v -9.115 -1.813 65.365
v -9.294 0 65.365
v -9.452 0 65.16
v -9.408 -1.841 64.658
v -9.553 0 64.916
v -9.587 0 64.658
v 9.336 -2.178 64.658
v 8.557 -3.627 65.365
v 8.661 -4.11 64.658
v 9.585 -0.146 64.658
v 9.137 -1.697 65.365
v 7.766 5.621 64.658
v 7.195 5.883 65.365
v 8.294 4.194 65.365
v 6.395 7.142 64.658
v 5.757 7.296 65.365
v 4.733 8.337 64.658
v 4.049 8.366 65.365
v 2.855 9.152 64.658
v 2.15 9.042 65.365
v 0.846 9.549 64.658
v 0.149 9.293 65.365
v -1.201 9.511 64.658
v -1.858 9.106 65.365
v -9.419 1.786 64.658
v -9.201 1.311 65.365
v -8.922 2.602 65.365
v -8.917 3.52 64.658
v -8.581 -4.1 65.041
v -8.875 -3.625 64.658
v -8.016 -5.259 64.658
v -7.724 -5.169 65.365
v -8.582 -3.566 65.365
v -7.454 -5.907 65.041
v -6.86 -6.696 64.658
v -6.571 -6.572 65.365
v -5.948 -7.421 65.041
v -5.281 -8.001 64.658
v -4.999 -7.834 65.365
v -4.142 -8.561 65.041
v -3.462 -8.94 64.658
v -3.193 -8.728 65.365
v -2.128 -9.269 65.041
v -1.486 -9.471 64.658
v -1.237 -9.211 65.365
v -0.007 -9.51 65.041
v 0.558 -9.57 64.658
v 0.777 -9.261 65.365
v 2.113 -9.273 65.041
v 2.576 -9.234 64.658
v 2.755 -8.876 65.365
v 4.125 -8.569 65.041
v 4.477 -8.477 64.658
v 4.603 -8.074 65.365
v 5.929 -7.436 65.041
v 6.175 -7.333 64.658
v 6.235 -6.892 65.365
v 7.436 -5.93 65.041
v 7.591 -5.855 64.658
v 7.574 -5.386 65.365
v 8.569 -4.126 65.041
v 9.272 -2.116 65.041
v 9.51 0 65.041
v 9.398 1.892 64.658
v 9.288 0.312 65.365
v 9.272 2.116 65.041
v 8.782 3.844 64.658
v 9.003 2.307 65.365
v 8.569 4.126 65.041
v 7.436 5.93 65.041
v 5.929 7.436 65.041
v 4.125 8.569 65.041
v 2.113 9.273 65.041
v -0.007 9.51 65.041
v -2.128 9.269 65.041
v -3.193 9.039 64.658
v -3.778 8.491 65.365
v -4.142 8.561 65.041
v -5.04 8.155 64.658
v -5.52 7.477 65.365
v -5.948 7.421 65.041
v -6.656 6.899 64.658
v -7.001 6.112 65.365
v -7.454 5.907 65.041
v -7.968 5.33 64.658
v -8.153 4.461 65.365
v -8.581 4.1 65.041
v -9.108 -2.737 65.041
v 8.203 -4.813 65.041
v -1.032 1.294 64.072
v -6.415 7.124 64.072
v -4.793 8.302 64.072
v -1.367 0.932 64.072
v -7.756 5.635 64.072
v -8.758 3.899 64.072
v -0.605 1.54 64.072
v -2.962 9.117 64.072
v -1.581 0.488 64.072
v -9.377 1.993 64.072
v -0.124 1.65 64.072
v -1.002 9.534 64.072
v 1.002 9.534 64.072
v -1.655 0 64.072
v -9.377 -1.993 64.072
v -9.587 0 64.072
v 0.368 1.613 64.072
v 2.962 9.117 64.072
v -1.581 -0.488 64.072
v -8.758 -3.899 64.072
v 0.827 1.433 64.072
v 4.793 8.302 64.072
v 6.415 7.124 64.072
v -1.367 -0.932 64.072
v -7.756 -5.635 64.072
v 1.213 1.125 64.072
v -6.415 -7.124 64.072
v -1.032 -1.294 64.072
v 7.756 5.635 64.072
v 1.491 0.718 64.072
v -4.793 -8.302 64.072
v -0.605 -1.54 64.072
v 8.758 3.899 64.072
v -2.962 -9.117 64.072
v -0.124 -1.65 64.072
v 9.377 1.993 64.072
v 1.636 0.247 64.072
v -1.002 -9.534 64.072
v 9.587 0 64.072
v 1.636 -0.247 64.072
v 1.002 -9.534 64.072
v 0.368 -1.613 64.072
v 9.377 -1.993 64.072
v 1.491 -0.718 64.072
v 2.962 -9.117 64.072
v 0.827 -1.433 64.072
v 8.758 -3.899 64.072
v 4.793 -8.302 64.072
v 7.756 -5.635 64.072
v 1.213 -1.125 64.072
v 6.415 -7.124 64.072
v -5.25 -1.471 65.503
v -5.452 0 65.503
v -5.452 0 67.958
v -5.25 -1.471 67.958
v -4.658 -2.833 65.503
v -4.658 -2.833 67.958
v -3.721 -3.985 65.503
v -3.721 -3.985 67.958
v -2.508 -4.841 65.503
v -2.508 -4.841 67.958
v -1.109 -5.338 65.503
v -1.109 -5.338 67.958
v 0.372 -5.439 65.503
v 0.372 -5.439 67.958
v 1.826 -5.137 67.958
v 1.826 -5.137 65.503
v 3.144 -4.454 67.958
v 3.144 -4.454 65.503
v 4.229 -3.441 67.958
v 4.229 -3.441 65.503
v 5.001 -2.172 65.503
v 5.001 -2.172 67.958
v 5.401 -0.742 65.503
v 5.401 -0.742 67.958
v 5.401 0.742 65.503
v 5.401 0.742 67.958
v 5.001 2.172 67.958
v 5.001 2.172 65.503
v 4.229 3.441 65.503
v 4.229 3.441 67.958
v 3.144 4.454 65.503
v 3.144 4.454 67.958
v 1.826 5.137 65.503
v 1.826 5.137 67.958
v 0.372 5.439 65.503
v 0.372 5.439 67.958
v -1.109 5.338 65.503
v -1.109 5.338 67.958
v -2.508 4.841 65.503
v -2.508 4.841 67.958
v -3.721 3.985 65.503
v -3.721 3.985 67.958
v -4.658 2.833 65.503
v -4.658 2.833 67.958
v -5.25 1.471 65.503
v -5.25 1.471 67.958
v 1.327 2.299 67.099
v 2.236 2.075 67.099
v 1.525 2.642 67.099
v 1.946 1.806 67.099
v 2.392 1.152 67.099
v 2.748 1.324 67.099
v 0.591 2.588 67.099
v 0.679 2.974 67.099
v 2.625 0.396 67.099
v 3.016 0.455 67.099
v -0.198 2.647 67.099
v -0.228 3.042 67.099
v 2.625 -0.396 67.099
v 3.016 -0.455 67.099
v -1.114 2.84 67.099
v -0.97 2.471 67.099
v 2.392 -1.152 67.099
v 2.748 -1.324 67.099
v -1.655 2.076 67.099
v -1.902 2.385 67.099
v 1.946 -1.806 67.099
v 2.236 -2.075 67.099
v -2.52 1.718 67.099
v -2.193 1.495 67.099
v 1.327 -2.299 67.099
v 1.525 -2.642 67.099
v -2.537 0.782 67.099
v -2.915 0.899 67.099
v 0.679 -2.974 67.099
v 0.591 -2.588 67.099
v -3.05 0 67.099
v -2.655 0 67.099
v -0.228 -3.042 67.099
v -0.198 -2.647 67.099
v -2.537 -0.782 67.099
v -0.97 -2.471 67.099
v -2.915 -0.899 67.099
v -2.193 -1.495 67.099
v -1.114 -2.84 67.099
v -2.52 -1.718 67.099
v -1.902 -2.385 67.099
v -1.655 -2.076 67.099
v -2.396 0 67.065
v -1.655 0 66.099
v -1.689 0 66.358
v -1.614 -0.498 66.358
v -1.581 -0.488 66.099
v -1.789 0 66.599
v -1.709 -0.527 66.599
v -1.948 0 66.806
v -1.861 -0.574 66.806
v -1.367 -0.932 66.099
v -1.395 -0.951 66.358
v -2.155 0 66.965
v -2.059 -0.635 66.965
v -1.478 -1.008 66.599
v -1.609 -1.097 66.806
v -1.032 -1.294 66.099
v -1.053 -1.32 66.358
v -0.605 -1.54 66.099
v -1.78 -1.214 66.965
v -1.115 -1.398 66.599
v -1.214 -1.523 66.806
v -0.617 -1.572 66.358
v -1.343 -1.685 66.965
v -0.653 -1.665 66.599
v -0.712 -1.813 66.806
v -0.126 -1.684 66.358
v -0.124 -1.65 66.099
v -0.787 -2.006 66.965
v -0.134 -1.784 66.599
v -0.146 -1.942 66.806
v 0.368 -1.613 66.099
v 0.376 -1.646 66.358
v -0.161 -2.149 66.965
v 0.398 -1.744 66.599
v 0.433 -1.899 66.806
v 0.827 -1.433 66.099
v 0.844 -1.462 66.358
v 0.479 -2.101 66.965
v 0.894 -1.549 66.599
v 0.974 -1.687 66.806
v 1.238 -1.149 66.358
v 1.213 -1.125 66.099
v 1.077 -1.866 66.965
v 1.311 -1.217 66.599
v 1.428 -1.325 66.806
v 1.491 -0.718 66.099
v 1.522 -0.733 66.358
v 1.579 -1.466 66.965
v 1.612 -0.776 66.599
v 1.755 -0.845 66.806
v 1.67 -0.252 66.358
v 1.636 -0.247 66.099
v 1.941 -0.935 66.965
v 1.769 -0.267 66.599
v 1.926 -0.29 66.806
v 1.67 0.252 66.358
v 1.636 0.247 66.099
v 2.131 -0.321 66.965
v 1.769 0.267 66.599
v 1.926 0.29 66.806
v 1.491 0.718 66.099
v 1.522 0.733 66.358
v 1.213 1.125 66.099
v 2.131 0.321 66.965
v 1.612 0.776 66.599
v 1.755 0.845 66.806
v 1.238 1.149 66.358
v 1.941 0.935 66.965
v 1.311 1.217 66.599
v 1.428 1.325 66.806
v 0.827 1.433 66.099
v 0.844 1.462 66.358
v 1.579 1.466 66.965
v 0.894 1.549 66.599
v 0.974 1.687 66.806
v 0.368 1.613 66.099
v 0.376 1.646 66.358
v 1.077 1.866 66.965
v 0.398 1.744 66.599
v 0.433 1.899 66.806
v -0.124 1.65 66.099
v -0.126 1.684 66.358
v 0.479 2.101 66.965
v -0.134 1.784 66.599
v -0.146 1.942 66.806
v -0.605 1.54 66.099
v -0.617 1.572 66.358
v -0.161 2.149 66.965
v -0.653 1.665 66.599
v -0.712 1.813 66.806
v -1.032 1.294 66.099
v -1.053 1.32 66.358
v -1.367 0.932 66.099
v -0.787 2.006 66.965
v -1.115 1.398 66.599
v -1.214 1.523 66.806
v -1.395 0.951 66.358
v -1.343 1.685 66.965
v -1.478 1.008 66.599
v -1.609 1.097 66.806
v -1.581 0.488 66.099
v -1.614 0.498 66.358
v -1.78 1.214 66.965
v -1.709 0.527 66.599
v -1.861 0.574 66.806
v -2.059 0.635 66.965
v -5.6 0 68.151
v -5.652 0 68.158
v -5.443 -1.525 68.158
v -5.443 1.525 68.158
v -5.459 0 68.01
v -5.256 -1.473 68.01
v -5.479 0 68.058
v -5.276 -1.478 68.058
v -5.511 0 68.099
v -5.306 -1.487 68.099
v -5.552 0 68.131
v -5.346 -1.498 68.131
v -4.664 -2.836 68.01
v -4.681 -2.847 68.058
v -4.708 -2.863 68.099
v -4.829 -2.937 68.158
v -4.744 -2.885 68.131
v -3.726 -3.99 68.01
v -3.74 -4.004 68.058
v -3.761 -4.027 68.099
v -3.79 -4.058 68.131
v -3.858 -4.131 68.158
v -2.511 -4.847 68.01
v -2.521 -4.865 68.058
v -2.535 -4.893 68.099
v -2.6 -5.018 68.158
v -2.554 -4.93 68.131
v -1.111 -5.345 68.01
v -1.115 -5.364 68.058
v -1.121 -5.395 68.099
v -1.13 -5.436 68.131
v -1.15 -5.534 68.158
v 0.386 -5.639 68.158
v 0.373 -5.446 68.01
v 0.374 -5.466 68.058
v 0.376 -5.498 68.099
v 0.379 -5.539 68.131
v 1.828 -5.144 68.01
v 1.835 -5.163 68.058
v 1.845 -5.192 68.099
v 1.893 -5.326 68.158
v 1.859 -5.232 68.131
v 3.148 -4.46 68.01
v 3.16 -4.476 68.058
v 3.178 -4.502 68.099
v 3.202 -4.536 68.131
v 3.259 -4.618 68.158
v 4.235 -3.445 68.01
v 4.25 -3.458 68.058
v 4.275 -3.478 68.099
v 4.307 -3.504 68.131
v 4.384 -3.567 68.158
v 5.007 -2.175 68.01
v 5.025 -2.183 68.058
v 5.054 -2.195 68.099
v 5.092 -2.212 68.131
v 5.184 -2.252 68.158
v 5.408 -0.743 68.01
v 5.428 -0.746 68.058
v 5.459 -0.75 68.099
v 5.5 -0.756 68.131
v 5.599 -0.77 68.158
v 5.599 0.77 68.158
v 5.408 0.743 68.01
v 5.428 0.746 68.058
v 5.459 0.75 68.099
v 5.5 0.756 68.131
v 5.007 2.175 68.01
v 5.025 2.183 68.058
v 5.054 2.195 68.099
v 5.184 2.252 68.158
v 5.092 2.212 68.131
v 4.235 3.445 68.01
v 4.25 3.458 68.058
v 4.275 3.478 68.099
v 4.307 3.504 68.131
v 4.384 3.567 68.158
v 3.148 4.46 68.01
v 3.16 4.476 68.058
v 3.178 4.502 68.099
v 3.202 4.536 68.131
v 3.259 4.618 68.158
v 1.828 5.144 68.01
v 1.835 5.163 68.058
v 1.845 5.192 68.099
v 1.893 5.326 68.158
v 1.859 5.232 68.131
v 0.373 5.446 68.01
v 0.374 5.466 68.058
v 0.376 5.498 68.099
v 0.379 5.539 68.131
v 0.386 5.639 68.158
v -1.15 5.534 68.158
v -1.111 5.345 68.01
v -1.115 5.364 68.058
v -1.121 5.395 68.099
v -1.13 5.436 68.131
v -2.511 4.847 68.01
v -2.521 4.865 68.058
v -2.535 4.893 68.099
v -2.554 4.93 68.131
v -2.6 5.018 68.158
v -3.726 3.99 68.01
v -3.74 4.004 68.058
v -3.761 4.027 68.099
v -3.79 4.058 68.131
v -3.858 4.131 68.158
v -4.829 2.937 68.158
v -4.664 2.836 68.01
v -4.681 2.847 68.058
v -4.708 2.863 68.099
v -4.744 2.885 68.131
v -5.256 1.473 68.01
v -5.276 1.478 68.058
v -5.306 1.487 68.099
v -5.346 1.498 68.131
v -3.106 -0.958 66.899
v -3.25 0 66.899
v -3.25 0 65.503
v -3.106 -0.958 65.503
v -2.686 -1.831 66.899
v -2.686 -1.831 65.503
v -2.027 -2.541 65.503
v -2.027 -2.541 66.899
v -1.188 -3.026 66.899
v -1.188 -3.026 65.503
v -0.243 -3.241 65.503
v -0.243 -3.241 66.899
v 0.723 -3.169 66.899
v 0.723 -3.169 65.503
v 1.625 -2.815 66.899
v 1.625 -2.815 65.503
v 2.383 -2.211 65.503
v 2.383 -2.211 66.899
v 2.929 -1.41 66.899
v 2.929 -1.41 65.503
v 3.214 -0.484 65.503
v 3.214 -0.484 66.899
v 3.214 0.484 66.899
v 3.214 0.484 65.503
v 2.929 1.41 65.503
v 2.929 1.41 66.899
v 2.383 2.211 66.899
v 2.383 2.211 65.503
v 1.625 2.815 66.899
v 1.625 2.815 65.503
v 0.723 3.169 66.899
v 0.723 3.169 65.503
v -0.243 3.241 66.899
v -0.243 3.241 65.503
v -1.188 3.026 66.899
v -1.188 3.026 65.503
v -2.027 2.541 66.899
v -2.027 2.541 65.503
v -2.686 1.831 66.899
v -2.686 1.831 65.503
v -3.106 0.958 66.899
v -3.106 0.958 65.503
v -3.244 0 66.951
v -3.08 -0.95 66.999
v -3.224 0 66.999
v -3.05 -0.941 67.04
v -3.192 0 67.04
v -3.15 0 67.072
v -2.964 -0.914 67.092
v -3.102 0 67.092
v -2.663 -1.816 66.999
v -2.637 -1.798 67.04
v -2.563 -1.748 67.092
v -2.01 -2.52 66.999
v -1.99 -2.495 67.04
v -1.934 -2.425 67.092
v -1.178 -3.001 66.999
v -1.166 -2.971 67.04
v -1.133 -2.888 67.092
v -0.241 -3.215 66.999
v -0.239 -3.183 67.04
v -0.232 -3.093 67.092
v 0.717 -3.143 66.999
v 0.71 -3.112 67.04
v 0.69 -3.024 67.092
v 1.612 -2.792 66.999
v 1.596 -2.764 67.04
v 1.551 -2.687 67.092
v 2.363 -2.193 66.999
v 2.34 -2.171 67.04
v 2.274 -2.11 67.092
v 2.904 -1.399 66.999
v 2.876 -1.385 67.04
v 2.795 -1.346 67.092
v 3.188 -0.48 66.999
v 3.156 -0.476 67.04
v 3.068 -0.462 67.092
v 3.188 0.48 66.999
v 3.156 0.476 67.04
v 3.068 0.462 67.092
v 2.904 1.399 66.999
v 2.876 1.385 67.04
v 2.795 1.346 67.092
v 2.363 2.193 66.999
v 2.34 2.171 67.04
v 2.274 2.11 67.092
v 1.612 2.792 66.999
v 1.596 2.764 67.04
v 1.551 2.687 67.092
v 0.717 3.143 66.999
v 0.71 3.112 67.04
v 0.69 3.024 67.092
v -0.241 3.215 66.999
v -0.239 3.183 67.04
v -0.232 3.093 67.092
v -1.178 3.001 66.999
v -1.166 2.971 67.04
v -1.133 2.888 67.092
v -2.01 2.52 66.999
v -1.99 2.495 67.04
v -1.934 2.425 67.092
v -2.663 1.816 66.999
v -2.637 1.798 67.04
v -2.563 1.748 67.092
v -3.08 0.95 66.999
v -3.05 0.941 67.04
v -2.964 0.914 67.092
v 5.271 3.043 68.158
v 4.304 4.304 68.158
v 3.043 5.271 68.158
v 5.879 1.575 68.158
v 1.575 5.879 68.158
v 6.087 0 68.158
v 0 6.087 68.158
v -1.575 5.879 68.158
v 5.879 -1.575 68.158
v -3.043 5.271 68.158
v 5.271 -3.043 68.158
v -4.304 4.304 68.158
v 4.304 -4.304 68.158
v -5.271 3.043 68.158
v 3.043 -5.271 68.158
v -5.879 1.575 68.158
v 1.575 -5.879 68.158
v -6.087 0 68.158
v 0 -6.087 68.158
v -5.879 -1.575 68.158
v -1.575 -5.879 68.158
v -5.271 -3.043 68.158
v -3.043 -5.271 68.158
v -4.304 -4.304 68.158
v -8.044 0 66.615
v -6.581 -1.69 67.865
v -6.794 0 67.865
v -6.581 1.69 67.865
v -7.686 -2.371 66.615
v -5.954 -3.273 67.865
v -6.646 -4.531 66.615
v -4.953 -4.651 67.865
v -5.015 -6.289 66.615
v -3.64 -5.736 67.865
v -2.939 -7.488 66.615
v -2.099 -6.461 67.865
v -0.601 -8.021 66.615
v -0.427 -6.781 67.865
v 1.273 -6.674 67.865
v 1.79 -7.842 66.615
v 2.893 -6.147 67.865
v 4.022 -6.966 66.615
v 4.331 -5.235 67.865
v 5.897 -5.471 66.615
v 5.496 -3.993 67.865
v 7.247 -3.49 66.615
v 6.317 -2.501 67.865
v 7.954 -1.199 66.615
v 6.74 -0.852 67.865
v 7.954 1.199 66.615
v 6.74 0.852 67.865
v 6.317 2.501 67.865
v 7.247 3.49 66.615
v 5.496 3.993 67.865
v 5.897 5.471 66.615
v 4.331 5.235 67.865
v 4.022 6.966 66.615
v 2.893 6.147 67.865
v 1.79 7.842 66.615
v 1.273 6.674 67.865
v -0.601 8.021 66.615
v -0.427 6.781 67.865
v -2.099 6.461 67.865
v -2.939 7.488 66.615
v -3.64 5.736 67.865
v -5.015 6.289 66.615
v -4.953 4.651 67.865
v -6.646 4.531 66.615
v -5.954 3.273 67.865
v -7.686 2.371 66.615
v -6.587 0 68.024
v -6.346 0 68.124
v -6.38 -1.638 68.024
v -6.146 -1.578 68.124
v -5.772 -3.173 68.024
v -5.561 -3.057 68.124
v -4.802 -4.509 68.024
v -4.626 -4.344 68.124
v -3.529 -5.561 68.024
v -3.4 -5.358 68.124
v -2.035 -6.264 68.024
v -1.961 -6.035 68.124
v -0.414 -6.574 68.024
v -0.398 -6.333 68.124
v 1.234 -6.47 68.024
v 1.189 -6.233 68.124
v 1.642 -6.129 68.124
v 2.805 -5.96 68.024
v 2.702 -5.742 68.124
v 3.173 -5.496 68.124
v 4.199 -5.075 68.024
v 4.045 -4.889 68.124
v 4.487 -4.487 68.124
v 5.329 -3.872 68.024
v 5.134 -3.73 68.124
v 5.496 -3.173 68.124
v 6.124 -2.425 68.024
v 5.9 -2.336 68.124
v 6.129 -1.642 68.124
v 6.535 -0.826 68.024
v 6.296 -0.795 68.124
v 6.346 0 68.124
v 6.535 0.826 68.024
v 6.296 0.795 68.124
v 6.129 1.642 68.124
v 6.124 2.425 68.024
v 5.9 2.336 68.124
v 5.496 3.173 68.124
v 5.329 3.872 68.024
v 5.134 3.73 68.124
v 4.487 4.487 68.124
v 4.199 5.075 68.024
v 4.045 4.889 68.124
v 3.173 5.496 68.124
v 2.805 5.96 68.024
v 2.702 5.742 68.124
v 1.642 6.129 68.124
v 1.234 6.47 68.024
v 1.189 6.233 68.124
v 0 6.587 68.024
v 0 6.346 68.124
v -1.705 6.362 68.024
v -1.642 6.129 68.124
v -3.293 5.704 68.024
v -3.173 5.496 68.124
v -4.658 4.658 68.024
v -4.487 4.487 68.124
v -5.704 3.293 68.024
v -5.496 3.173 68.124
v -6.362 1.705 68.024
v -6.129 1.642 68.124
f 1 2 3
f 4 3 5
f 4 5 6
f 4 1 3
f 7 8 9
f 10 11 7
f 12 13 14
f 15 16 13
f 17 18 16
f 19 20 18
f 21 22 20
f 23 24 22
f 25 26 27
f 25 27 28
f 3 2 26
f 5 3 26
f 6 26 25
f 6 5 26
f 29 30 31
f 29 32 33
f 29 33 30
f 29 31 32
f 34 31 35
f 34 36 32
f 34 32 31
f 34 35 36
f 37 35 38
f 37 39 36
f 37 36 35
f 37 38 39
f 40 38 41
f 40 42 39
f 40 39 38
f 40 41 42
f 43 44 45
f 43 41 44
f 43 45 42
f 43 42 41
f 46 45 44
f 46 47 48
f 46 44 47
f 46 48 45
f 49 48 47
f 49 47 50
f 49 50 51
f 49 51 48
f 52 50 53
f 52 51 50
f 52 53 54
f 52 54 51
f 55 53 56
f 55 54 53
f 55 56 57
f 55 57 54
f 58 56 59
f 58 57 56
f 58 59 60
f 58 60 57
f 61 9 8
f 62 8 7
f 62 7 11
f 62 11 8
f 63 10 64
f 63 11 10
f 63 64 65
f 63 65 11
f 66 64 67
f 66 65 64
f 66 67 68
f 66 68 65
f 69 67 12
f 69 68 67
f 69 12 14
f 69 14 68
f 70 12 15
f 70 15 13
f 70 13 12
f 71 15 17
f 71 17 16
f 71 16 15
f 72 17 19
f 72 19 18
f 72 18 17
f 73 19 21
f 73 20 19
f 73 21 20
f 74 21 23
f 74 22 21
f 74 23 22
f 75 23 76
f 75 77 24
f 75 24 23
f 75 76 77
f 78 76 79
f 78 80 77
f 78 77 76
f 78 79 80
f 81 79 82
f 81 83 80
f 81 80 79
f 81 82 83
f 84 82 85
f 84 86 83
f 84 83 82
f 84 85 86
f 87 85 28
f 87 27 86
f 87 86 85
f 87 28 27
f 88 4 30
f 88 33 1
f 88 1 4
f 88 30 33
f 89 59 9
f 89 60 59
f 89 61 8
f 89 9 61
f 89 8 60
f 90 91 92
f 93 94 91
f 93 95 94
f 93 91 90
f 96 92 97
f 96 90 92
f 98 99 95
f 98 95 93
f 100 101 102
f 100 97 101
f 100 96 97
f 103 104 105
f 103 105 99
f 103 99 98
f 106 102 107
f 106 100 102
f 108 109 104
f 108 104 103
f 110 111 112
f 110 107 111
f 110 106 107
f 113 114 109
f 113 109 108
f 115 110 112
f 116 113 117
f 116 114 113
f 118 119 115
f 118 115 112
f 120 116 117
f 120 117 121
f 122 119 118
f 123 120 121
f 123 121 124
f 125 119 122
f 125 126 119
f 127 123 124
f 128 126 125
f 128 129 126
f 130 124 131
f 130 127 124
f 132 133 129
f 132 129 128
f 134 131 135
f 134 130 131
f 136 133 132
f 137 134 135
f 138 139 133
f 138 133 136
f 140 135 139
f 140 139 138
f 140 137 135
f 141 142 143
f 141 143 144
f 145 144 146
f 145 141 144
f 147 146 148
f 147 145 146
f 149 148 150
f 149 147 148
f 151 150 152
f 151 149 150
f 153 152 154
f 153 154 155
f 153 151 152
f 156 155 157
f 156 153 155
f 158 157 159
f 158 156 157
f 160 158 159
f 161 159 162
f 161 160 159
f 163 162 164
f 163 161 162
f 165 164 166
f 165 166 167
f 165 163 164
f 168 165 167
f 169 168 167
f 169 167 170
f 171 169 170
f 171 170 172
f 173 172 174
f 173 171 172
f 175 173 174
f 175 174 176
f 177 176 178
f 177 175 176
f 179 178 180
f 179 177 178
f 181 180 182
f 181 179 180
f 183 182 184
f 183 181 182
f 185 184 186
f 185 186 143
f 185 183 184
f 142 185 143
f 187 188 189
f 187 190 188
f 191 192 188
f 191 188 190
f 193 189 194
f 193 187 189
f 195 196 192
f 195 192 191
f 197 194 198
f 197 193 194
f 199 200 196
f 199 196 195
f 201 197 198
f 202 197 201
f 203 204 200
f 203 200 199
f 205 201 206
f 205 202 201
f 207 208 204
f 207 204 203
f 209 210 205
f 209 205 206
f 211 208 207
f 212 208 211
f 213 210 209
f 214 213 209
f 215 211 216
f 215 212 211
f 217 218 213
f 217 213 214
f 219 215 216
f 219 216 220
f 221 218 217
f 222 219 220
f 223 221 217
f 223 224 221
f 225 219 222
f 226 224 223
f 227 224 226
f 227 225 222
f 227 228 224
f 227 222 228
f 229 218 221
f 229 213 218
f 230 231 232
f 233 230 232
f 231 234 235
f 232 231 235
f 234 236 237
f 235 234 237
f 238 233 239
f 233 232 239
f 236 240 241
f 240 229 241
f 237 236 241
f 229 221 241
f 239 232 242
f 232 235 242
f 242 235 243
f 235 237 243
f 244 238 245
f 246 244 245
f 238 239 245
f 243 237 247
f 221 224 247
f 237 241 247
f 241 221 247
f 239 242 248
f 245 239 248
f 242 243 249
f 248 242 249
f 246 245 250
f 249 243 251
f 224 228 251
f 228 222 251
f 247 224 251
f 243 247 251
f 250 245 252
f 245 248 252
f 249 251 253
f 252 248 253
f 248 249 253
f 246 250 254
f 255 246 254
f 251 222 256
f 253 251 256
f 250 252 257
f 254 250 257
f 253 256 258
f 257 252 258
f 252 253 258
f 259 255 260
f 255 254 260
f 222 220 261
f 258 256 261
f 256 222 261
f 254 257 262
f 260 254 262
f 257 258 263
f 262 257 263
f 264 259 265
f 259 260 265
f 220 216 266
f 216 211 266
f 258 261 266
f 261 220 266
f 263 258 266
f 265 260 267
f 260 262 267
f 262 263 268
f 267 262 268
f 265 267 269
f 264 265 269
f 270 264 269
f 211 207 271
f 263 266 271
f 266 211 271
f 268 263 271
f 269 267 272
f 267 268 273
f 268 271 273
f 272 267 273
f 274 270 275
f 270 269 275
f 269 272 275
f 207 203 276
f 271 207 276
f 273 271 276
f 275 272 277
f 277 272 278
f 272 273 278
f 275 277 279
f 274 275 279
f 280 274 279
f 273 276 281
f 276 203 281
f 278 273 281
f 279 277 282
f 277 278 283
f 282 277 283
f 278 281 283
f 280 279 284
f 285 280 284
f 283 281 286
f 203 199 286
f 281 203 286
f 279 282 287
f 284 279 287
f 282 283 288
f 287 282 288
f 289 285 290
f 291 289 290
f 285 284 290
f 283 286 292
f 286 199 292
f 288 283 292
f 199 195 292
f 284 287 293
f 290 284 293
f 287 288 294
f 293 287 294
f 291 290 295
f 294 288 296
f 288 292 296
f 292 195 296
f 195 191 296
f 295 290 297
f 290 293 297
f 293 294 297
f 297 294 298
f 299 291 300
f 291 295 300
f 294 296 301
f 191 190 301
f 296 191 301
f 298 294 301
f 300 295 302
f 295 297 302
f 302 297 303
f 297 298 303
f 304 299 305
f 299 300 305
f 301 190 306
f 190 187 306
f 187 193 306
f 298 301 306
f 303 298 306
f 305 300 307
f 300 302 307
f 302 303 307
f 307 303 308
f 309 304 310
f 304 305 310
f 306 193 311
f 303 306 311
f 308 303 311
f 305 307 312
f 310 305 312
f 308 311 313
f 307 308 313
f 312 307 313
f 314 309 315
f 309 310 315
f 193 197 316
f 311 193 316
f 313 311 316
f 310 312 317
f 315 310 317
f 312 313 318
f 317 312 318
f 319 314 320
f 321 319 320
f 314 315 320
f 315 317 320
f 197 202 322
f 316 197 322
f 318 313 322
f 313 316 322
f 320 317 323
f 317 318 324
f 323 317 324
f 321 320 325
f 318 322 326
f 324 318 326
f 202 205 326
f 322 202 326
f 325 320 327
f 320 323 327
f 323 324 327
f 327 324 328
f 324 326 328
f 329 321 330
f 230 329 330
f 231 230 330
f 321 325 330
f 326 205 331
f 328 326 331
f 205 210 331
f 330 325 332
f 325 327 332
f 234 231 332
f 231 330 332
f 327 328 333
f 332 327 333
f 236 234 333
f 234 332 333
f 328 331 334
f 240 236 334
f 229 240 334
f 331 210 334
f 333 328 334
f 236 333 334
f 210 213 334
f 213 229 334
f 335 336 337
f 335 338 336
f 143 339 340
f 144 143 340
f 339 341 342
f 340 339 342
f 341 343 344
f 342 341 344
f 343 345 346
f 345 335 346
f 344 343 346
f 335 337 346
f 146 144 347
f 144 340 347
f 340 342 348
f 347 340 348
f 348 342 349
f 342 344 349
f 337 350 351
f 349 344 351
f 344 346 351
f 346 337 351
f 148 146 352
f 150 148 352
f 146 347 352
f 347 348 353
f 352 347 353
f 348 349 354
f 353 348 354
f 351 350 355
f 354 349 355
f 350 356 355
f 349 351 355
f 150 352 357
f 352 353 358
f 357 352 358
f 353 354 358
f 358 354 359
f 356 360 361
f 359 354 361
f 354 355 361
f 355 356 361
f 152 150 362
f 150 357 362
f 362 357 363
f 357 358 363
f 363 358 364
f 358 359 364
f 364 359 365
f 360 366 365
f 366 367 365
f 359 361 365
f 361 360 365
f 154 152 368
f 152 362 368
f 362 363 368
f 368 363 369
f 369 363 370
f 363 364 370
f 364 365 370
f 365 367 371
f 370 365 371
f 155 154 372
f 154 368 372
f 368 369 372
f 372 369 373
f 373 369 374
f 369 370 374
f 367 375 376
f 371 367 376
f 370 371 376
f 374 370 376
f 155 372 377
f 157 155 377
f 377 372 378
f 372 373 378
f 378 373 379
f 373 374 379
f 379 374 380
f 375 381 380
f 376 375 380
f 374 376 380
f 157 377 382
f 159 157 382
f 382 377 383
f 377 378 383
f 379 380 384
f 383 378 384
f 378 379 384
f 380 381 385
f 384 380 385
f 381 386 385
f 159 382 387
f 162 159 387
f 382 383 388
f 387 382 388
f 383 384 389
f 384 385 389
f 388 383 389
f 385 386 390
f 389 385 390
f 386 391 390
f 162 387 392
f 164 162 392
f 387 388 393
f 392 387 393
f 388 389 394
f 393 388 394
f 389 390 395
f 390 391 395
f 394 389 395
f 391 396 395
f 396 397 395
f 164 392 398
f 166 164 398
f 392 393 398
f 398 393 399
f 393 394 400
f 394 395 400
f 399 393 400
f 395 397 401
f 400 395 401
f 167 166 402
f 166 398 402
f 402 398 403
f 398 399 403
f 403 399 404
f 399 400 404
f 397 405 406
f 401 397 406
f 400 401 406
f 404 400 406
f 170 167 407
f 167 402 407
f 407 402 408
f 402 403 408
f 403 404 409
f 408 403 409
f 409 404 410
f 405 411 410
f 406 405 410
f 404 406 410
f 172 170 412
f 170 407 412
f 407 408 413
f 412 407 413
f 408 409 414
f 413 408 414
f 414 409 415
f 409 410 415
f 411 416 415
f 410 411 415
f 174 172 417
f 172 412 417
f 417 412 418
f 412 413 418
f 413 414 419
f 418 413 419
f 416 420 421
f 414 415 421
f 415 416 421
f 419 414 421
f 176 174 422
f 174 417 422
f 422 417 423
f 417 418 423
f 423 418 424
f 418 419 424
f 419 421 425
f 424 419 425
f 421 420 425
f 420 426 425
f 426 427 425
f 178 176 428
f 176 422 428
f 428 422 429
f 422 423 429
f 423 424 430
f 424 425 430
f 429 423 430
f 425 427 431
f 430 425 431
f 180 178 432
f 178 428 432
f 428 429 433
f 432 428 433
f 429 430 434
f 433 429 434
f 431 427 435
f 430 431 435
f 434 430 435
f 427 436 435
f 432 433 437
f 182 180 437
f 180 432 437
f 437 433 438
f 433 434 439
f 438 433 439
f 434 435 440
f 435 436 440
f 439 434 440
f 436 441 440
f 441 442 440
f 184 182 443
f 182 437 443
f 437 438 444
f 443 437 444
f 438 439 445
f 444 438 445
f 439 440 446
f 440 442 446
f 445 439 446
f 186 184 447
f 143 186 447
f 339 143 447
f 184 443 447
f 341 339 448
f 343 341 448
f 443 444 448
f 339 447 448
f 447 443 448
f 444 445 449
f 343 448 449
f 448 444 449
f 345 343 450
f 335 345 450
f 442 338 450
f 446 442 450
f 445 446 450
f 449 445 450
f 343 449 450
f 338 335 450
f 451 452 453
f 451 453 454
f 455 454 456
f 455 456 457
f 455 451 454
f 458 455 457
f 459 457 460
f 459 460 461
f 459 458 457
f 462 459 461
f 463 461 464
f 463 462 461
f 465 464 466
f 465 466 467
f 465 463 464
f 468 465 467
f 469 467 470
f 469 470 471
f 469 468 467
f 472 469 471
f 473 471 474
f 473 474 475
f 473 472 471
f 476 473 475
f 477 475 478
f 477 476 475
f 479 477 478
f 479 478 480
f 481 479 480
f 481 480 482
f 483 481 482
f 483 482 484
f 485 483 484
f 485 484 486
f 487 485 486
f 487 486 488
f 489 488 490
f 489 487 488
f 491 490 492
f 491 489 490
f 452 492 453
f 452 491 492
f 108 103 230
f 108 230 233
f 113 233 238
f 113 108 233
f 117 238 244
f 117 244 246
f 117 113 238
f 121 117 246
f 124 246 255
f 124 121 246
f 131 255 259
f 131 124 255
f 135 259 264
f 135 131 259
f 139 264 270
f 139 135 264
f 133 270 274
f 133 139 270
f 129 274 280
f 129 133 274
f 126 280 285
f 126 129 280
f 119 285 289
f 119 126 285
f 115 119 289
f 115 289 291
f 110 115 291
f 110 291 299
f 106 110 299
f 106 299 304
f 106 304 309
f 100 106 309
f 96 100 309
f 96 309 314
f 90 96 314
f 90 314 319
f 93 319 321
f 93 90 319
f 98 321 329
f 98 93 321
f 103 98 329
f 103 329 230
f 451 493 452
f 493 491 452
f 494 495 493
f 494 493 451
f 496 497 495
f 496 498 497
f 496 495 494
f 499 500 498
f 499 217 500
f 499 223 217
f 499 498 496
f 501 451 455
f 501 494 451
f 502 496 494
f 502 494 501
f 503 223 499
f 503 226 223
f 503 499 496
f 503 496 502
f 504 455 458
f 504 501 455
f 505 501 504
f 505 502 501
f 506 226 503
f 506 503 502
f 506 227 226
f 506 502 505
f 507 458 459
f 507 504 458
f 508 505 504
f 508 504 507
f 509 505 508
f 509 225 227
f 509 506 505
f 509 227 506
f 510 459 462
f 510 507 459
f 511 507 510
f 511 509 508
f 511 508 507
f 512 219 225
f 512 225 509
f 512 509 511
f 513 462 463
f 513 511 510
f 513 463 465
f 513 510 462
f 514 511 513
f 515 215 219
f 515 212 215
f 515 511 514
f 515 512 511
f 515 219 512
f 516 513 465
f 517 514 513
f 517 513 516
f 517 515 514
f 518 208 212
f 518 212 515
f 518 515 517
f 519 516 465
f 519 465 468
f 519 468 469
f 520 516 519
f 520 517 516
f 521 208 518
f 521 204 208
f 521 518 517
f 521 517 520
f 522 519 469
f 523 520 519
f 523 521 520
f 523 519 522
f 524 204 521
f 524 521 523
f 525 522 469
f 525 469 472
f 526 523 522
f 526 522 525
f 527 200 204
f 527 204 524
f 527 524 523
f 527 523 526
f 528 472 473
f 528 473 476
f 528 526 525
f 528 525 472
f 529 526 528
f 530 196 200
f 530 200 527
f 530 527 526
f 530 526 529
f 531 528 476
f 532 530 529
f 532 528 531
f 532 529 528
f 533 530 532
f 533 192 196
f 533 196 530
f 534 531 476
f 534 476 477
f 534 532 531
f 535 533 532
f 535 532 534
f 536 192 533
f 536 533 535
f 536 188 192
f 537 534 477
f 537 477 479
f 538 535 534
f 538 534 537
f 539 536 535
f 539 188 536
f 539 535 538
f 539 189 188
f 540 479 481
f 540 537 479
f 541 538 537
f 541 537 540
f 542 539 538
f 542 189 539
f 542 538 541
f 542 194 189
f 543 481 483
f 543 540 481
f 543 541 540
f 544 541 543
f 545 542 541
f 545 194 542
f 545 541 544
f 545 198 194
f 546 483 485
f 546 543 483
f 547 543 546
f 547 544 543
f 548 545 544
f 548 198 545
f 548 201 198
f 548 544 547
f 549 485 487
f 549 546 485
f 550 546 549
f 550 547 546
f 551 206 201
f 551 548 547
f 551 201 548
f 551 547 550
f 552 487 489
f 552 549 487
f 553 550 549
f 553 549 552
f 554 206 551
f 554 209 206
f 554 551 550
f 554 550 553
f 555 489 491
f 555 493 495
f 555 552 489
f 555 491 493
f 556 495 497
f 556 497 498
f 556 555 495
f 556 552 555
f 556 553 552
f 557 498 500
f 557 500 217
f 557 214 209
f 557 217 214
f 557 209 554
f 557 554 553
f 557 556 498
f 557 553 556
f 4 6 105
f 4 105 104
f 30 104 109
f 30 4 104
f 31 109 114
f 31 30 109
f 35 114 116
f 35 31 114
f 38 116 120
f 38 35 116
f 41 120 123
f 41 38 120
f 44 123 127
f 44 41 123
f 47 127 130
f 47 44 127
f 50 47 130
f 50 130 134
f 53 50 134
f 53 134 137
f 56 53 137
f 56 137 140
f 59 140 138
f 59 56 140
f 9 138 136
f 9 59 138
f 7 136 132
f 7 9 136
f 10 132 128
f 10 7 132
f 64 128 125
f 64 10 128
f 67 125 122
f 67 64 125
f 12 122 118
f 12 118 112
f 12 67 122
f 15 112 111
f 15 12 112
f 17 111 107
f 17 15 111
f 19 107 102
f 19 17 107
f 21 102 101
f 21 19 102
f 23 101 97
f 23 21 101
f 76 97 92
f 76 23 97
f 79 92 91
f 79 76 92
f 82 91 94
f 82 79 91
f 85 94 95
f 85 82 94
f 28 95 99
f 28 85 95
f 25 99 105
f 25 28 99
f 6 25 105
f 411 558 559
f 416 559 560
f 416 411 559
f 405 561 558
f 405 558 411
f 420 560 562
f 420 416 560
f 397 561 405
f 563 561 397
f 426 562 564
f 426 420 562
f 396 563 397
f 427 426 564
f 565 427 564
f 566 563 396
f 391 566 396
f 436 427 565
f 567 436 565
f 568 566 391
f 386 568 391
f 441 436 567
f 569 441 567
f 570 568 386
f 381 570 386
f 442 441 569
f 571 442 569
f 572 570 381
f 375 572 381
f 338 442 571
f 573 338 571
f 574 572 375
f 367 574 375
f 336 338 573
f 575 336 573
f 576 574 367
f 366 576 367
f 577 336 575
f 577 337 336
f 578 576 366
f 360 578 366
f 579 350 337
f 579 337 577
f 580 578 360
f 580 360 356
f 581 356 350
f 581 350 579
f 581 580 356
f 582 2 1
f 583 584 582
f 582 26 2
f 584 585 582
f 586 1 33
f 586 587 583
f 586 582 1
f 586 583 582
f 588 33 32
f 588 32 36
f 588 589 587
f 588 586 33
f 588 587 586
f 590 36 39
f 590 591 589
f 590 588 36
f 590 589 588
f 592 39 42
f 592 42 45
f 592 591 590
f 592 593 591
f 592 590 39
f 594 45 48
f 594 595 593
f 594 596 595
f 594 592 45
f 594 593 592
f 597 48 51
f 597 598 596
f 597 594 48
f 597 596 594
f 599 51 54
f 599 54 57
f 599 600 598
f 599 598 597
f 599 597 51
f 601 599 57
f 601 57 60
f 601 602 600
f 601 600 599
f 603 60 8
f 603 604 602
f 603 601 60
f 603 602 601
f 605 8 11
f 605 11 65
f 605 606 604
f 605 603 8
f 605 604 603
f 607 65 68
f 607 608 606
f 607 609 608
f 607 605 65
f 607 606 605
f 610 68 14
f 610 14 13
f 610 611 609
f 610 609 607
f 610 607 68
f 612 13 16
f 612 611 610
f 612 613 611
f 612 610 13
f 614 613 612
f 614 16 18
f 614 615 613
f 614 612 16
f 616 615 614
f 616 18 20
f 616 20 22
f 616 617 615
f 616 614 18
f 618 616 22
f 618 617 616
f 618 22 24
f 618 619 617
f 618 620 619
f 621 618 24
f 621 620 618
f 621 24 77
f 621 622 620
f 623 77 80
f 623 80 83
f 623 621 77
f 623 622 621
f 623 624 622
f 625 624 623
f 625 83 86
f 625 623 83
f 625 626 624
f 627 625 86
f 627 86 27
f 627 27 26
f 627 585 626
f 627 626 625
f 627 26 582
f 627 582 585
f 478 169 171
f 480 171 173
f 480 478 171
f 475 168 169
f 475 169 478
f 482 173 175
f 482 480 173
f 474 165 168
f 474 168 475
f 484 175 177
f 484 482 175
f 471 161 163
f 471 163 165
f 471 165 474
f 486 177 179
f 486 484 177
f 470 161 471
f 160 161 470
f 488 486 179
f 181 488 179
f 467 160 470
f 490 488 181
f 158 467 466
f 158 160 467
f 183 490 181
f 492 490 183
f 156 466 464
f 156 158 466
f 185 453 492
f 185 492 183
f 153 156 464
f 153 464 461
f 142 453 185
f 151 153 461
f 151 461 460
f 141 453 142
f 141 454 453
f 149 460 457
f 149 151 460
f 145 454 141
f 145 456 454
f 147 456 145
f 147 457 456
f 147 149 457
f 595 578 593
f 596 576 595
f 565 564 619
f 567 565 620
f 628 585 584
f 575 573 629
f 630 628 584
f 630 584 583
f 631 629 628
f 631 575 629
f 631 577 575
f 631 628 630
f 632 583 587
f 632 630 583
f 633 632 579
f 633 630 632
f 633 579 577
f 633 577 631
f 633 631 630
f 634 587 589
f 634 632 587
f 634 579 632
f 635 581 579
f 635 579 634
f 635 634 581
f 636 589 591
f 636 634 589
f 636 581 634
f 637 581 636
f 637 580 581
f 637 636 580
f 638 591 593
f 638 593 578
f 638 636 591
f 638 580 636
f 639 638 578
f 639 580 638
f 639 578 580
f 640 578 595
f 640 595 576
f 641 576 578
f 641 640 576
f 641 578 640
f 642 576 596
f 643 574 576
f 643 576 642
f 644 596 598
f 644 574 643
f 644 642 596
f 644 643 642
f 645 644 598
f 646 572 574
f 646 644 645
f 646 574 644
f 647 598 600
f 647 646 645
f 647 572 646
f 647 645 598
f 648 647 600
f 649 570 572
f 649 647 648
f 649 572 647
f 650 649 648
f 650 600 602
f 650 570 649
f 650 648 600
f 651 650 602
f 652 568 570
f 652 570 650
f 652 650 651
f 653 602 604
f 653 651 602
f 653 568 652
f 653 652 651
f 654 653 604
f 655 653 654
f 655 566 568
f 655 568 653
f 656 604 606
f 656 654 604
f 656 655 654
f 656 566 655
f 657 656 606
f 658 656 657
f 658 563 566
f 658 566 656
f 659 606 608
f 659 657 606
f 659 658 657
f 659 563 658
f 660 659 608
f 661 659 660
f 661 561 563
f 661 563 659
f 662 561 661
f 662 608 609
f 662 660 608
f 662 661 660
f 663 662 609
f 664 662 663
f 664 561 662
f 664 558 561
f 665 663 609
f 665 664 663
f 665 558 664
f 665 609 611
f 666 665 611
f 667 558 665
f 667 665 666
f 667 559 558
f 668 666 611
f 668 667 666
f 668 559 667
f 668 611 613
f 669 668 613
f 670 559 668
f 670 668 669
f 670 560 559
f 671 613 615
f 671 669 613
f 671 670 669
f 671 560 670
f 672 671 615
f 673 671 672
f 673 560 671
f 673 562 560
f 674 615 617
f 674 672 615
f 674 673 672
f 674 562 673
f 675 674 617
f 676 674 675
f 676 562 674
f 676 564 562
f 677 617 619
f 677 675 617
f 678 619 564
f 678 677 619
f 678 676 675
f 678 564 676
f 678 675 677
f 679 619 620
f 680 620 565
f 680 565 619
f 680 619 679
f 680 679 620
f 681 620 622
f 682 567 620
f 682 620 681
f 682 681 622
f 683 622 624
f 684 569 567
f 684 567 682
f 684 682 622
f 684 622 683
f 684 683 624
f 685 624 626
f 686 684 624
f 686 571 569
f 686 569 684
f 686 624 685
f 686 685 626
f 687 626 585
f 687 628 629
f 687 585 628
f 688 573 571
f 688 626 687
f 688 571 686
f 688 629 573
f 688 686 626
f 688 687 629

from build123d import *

# Parameters (mm, degrees)
FILLET005_R = 1
FILLET006_R = 1
FILLET007_R = 1
FILLET008_R = 0.2
FILLET009_R = 0.2


with BuildPart() as part:
    # Sketch006 → Revolution003 (revolve)
    with BuildSketch(Plane.XZ):
        Polygon((-1.654667, 64.072456), (-9.586614, 64.072456), (-9.586614, 65.072456), (-6.501082, 68.157988), (-5.452098, 68.157988), (-5.452098, 65.502701), (-3.250405, 65.502701), (-3.250405, 67.098916), (-1.654667, 67.098916), align=None)
    revolve(axis=Axis((0, 0, 0), (0, 0, 1)))

    # Fillet005
    fillet005_edges = [part.edges().sort_by_distance(p)[0] for p in [
        (6.501082, 0, 68.157988),
    ]]
    fillet(fillet005_edges, radius=FILLET005_R)

    # Fillet006
    fillet006_edges = [part.edges().sort_by_distance(p)[0] for p in [
        (9.586614, 0, 65.072456),
    ]]
    fillet(fillet006_edges, radius=FILLET006_R)

    # Fillet007
    fillet007_edges = [part.edges().sort_by_distance(p)[0] for p in [
        (1.654667, 0, 67.098916),
    ]]
    fillet(fillet007_edges, radius=FILLET007_R)

    # Fillet008
    fillet008_edges = [part.edges().sort_by_distance(p)[0] for p in [
        (5.452098, 0, 68.157988),
    ]]
    fillet(fillet008_edges, radius=FILLET008_R)

    # Fillet009
    fillet009_edges = [part.edges().sort_by_distance(p)[0] for p in [
        (3.250405, 0, 67.098916),
    ]]
    fillet(fillet009_edges, radius=FILLET009_R)


solid = part.part
